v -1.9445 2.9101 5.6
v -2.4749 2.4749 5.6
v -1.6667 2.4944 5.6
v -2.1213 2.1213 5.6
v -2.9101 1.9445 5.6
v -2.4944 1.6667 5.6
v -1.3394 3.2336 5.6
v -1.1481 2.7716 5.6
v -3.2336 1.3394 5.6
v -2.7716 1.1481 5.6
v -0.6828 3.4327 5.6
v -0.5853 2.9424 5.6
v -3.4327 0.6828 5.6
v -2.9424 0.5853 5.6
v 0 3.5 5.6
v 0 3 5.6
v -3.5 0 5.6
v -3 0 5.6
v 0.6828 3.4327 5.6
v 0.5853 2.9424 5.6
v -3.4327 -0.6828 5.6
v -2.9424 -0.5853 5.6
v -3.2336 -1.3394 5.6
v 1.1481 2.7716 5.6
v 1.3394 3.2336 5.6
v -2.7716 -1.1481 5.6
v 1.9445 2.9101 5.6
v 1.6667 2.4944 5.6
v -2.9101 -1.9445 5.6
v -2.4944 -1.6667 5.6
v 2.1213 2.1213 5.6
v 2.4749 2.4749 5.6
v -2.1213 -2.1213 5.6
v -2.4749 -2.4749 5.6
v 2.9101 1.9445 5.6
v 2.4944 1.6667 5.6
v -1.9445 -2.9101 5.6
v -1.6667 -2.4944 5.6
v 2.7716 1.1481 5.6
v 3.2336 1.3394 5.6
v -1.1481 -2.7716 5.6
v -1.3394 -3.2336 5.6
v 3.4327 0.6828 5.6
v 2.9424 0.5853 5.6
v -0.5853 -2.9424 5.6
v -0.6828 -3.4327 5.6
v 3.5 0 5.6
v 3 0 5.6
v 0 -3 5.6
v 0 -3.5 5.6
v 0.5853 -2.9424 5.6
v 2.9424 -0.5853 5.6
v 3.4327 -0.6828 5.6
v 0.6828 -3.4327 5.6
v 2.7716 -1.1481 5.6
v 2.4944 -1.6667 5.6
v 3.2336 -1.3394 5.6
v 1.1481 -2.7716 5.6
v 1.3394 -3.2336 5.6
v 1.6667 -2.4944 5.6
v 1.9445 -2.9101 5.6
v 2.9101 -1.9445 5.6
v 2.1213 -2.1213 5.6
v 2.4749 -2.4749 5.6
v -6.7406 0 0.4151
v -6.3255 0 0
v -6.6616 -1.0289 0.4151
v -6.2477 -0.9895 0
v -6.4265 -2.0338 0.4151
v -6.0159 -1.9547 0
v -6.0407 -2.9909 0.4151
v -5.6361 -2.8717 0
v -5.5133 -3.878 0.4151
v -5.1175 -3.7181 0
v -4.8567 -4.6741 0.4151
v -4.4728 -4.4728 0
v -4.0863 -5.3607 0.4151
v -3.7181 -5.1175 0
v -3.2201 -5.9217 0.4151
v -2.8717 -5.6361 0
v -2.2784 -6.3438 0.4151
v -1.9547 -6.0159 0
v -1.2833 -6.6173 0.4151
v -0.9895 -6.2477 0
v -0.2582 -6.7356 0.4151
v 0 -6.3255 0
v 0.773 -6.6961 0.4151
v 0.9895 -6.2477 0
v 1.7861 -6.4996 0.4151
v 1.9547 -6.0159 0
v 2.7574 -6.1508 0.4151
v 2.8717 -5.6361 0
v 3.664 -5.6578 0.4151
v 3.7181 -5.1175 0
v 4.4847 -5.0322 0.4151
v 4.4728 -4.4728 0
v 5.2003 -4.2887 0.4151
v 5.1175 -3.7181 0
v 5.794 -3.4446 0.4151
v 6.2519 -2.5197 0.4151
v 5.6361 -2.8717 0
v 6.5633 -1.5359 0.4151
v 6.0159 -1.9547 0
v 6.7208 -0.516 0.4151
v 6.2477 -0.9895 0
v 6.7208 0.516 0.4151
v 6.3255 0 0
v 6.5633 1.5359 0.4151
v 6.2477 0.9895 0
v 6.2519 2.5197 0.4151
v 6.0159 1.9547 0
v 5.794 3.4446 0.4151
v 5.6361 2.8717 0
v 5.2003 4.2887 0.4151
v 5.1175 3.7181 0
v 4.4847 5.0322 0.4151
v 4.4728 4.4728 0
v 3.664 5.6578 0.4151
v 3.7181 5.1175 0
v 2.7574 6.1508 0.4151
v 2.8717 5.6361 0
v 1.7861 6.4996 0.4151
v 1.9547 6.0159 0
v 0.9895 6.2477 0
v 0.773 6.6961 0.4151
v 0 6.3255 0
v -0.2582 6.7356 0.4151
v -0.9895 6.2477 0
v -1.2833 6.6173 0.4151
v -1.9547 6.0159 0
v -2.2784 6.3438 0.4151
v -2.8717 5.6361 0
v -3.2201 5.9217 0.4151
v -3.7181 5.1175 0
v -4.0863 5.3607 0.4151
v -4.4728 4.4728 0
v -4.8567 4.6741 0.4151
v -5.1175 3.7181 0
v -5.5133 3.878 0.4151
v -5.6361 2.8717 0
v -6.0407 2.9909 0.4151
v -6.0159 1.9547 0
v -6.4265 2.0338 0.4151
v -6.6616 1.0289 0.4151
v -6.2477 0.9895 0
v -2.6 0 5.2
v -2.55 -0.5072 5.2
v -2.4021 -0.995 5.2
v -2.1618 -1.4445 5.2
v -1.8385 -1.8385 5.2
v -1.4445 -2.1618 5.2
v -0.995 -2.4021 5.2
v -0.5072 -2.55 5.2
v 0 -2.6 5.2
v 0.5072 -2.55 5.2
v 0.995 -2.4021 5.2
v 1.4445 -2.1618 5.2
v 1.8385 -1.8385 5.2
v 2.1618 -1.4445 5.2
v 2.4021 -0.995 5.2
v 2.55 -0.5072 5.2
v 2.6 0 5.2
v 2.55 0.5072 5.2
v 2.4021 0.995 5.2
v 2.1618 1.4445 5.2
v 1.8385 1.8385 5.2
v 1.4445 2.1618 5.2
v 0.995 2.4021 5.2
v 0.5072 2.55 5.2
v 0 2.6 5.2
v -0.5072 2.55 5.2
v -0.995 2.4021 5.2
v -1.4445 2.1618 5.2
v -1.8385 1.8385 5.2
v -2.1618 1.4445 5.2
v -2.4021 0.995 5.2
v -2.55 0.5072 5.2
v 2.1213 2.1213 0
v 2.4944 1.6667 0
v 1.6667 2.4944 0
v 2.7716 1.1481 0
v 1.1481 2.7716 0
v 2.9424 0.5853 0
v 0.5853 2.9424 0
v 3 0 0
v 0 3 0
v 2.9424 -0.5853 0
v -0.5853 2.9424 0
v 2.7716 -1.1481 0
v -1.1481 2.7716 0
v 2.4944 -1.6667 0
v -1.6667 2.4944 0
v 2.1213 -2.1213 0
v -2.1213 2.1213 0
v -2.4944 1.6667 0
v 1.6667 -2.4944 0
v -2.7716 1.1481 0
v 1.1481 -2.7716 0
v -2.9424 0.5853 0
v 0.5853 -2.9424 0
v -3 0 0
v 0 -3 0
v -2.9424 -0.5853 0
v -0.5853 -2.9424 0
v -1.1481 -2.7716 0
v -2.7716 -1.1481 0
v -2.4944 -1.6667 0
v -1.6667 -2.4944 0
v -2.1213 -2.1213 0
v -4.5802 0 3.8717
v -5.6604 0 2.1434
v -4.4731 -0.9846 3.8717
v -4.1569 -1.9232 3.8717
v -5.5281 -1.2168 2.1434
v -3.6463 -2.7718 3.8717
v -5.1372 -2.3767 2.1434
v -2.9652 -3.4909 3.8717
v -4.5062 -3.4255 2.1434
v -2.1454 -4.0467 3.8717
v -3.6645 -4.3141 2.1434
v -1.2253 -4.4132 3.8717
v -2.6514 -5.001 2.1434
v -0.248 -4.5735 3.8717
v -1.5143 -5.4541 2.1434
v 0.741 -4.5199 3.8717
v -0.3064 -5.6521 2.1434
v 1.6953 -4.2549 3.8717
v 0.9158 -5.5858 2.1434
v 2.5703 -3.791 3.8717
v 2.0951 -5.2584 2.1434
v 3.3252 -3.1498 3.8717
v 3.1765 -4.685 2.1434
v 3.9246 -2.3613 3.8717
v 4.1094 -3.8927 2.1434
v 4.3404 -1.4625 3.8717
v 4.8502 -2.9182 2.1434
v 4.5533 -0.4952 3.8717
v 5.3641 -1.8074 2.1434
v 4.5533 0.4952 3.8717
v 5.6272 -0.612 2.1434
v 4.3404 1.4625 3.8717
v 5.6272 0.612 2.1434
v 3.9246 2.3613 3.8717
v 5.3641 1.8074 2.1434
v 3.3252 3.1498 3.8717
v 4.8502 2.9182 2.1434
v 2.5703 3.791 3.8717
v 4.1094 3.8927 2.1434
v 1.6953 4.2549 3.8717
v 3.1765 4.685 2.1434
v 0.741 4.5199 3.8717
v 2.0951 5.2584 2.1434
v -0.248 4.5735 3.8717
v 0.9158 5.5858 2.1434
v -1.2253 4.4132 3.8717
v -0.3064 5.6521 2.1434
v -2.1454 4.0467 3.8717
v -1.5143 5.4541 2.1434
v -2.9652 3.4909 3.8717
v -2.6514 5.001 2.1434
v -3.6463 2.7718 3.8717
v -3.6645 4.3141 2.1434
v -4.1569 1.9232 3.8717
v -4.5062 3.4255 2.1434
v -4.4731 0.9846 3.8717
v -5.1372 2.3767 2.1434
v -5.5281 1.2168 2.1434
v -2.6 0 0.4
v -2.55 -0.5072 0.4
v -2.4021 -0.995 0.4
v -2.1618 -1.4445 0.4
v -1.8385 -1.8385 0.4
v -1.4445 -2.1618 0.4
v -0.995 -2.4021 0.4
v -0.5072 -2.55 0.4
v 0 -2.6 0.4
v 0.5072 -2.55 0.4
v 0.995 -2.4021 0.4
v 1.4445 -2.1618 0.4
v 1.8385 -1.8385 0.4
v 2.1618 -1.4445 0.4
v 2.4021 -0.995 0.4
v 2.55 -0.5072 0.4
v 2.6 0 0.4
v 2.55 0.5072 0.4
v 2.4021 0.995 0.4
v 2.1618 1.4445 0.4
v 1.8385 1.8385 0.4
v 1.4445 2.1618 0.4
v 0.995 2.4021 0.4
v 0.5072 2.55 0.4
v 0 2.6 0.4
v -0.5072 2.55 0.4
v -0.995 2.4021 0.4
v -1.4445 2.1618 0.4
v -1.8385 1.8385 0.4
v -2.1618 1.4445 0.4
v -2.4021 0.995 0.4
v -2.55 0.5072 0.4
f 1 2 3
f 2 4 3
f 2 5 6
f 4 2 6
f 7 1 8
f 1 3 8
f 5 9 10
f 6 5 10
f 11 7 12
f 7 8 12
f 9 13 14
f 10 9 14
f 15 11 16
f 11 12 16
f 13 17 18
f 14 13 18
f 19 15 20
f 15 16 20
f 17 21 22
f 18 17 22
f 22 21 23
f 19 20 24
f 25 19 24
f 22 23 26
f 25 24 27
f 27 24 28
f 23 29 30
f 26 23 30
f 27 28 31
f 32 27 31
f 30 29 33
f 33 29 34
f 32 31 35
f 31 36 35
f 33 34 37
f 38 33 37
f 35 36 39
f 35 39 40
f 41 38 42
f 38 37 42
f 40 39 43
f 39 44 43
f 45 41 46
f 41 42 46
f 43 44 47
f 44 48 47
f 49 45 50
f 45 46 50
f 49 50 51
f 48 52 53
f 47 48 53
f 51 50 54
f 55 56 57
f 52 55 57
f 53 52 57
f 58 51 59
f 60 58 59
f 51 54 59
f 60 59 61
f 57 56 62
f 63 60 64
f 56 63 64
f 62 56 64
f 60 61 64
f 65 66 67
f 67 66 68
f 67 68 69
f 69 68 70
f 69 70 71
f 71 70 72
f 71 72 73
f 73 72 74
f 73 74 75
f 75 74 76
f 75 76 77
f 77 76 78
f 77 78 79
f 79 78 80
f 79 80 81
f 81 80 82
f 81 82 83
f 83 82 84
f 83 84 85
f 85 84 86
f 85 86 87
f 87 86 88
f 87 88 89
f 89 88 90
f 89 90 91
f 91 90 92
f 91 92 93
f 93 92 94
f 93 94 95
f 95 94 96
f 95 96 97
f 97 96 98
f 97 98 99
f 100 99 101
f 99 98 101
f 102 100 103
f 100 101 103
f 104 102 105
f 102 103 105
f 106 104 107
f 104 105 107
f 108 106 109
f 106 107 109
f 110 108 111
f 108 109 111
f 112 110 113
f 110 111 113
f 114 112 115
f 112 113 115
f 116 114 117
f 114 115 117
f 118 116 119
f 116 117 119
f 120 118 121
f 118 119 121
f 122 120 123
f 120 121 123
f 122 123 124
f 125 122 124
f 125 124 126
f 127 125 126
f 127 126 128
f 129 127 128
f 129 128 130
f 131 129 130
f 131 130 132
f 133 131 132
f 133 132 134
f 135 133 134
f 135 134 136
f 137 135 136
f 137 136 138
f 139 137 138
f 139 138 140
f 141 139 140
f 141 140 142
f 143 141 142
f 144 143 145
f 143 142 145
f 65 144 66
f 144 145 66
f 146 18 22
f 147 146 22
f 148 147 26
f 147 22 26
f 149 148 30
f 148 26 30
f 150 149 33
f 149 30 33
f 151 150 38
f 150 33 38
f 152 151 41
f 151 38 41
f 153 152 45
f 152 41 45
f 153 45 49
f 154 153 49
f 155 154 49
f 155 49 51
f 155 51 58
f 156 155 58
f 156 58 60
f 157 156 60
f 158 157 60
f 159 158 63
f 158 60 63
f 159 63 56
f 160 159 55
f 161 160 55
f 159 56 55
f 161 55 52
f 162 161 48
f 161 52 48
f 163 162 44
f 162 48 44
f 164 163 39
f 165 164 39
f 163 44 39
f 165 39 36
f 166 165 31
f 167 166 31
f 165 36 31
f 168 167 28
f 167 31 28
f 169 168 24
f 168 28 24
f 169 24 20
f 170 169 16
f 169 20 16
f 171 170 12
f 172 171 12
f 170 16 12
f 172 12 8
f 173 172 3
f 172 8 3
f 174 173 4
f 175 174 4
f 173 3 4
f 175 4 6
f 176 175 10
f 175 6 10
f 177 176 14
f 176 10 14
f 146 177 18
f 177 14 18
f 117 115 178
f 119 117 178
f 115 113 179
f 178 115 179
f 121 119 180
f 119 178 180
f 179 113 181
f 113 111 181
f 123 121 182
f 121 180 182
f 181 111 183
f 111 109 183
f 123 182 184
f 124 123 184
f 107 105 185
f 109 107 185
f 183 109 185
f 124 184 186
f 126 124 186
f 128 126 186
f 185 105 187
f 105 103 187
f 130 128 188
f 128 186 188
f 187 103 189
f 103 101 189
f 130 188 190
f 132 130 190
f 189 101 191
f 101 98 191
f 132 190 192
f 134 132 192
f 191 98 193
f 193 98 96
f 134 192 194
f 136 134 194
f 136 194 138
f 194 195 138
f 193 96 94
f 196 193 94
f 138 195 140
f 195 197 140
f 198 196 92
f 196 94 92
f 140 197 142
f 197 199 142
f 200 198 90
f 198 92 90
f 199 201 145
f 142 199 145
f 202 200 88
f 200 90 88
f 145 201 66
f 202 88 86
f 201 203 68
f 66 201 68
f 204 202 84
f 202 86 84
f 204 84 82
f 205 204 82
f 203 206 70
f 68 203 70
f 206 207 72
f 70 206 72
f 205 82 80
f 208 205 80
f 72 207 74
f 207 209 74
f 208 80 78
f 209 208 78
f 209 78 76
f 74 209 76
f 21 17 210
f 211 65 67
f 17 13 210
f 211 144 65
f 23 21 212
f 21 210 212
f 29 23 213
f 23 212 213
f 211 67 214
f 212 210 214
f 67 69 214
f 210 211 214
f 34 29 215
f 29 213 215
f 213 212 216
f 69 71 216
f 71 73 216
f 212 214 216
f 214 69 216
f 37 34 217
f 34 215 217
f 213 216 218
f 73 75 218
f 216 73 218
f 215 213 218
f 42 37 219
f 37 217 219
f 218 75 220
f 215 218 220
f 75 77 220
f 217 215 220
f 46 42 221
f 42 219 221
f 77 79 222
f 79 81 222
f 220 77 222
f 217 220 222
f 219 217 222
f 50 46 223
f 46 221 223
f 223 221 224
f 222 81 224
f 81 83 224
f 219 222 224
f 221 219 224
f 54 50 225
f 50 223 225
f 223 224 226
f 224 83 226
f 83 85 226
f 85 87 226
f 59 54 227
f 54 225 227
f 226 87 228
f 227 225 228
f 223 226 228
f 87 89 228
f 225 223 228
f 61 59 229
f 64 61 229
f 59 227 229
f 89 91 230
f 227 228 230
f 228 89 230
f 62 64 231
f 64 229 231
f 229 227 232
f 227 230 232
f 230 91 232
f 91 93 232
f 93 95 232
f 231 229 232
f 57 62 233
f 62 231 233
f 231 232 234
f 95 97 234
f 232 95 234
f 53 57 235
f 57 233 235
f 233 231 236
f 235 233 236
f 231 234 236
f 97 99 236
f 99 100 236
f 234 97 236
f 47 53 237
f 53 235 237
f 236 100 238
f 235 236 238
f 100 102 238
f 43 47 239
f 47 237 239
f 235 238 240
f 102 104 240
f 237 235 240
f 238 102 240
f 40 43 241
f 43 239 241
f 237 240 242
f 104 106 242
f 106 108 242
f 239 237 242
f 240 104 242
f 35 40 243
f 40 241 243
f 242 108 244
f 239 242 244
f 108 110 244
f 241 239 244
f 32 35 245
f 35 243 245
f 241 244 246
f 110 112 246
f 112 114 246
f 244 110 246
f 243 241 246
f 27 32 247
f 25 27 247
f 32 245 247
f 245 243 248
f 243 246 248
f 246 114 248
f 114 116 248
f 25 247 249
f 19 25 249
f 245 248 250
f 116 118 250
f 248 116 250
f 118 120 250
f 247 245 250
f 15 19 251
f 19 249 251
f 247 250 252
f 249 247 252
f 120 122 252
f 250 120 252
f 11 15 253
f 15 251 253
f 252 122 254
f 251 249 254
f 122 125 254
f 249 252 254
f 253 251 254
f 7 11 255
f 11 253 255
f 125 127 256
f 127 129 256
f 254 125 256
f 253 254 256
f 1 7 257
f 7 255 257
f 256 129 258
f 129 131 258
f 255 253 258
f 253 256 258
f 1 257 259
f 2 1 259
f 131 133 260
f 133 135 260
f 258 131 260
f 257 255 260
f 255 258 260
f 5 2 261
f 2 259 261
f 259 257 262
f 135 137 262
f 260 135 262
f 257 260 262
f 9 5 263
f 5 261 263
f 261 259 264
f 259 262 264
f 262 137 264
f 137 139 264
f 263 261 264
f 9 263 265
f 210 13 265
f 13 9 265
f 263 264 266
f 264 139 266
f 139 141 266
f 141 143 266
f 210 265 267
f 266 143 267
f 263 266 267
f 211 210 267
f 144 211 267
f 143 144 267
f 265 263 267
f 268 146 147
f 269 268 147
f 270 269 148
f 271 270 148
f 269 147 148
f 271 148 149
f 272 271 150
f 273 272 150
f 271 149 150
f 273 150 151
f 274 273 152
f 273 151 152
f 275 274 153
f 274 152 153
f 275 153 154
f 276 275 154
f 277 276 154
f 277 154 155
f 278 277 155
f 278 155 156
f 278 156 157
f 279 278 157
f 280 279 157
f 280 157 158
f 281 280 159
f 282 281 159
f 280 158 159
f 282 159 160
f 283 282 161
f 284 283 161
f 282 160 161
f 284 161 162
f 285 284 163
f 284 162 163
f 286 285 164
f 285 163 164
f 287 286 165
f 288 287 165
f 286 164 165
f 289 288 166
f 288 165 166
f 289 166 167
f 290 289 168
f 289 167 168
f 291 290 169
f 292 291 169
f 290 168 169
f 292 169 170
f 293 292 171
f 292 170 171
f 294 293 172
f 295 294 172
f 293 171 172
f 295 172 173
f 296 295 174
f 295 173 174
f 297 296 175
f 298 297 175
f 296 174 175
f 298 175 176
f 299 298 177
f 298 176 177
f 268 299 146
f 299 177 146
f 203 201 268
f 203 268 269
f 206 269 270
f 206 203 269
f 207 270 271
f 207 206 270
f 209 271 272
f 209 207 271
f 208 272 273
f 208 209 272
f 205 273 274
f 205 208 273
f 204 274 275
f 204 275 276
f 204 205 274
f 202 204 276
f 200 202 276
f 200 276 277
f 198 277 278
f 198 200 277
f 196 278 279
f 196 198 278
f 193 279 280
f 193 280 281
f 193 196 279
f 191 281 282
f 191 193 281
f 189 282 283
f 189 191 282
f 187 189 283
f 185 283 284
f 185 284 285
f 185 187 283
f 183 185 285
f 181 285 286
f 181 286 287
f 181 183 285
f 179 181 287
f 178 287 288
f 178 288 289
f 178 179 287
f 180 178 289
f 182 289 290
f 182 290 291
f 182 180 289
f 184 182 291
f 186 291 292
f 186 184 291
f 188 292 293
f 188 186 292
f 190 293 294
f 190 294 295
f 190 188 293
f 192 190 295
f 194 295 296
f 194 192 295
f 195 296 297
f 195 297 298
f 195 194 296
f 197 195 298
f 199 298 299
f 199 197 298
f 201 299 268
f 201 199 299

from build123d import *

# Parameters (mm, degrees)
FASE1_SIZE = 0.4


with BuildPart() as part:
    # Skizze5 → Rotation1 (revolve)
    with BuildSketch(Plane(origin=(0, 0, 0), x_dir=(0, 0, -1), z_dir=(1, 0, 0)), mode=Mode.PRIVATE) as rotation1_sk:
        Polygon((0, 2.6), (-5.6, 2.6), (-5.6, 3.5), (-0.415050889, 6.740593194), (0, 6.325542305), align=None)
    revolve(rotation1_sk.sketch.rotate(Axis((0, 0, 0), (0, 0, 1)), 90), axis=Axis((0, 0, 0), (0, 0, 1)))

    # Fase1
    fase1_edges = [part.edges().sort_by_distance(p)[0] for p in [
        (2.6, 0, 5.6),
        (2.6, 0, 0),
    ]]
    chamfer(fase1_edges, length=FASE1_SIZE)


solid = part.part
